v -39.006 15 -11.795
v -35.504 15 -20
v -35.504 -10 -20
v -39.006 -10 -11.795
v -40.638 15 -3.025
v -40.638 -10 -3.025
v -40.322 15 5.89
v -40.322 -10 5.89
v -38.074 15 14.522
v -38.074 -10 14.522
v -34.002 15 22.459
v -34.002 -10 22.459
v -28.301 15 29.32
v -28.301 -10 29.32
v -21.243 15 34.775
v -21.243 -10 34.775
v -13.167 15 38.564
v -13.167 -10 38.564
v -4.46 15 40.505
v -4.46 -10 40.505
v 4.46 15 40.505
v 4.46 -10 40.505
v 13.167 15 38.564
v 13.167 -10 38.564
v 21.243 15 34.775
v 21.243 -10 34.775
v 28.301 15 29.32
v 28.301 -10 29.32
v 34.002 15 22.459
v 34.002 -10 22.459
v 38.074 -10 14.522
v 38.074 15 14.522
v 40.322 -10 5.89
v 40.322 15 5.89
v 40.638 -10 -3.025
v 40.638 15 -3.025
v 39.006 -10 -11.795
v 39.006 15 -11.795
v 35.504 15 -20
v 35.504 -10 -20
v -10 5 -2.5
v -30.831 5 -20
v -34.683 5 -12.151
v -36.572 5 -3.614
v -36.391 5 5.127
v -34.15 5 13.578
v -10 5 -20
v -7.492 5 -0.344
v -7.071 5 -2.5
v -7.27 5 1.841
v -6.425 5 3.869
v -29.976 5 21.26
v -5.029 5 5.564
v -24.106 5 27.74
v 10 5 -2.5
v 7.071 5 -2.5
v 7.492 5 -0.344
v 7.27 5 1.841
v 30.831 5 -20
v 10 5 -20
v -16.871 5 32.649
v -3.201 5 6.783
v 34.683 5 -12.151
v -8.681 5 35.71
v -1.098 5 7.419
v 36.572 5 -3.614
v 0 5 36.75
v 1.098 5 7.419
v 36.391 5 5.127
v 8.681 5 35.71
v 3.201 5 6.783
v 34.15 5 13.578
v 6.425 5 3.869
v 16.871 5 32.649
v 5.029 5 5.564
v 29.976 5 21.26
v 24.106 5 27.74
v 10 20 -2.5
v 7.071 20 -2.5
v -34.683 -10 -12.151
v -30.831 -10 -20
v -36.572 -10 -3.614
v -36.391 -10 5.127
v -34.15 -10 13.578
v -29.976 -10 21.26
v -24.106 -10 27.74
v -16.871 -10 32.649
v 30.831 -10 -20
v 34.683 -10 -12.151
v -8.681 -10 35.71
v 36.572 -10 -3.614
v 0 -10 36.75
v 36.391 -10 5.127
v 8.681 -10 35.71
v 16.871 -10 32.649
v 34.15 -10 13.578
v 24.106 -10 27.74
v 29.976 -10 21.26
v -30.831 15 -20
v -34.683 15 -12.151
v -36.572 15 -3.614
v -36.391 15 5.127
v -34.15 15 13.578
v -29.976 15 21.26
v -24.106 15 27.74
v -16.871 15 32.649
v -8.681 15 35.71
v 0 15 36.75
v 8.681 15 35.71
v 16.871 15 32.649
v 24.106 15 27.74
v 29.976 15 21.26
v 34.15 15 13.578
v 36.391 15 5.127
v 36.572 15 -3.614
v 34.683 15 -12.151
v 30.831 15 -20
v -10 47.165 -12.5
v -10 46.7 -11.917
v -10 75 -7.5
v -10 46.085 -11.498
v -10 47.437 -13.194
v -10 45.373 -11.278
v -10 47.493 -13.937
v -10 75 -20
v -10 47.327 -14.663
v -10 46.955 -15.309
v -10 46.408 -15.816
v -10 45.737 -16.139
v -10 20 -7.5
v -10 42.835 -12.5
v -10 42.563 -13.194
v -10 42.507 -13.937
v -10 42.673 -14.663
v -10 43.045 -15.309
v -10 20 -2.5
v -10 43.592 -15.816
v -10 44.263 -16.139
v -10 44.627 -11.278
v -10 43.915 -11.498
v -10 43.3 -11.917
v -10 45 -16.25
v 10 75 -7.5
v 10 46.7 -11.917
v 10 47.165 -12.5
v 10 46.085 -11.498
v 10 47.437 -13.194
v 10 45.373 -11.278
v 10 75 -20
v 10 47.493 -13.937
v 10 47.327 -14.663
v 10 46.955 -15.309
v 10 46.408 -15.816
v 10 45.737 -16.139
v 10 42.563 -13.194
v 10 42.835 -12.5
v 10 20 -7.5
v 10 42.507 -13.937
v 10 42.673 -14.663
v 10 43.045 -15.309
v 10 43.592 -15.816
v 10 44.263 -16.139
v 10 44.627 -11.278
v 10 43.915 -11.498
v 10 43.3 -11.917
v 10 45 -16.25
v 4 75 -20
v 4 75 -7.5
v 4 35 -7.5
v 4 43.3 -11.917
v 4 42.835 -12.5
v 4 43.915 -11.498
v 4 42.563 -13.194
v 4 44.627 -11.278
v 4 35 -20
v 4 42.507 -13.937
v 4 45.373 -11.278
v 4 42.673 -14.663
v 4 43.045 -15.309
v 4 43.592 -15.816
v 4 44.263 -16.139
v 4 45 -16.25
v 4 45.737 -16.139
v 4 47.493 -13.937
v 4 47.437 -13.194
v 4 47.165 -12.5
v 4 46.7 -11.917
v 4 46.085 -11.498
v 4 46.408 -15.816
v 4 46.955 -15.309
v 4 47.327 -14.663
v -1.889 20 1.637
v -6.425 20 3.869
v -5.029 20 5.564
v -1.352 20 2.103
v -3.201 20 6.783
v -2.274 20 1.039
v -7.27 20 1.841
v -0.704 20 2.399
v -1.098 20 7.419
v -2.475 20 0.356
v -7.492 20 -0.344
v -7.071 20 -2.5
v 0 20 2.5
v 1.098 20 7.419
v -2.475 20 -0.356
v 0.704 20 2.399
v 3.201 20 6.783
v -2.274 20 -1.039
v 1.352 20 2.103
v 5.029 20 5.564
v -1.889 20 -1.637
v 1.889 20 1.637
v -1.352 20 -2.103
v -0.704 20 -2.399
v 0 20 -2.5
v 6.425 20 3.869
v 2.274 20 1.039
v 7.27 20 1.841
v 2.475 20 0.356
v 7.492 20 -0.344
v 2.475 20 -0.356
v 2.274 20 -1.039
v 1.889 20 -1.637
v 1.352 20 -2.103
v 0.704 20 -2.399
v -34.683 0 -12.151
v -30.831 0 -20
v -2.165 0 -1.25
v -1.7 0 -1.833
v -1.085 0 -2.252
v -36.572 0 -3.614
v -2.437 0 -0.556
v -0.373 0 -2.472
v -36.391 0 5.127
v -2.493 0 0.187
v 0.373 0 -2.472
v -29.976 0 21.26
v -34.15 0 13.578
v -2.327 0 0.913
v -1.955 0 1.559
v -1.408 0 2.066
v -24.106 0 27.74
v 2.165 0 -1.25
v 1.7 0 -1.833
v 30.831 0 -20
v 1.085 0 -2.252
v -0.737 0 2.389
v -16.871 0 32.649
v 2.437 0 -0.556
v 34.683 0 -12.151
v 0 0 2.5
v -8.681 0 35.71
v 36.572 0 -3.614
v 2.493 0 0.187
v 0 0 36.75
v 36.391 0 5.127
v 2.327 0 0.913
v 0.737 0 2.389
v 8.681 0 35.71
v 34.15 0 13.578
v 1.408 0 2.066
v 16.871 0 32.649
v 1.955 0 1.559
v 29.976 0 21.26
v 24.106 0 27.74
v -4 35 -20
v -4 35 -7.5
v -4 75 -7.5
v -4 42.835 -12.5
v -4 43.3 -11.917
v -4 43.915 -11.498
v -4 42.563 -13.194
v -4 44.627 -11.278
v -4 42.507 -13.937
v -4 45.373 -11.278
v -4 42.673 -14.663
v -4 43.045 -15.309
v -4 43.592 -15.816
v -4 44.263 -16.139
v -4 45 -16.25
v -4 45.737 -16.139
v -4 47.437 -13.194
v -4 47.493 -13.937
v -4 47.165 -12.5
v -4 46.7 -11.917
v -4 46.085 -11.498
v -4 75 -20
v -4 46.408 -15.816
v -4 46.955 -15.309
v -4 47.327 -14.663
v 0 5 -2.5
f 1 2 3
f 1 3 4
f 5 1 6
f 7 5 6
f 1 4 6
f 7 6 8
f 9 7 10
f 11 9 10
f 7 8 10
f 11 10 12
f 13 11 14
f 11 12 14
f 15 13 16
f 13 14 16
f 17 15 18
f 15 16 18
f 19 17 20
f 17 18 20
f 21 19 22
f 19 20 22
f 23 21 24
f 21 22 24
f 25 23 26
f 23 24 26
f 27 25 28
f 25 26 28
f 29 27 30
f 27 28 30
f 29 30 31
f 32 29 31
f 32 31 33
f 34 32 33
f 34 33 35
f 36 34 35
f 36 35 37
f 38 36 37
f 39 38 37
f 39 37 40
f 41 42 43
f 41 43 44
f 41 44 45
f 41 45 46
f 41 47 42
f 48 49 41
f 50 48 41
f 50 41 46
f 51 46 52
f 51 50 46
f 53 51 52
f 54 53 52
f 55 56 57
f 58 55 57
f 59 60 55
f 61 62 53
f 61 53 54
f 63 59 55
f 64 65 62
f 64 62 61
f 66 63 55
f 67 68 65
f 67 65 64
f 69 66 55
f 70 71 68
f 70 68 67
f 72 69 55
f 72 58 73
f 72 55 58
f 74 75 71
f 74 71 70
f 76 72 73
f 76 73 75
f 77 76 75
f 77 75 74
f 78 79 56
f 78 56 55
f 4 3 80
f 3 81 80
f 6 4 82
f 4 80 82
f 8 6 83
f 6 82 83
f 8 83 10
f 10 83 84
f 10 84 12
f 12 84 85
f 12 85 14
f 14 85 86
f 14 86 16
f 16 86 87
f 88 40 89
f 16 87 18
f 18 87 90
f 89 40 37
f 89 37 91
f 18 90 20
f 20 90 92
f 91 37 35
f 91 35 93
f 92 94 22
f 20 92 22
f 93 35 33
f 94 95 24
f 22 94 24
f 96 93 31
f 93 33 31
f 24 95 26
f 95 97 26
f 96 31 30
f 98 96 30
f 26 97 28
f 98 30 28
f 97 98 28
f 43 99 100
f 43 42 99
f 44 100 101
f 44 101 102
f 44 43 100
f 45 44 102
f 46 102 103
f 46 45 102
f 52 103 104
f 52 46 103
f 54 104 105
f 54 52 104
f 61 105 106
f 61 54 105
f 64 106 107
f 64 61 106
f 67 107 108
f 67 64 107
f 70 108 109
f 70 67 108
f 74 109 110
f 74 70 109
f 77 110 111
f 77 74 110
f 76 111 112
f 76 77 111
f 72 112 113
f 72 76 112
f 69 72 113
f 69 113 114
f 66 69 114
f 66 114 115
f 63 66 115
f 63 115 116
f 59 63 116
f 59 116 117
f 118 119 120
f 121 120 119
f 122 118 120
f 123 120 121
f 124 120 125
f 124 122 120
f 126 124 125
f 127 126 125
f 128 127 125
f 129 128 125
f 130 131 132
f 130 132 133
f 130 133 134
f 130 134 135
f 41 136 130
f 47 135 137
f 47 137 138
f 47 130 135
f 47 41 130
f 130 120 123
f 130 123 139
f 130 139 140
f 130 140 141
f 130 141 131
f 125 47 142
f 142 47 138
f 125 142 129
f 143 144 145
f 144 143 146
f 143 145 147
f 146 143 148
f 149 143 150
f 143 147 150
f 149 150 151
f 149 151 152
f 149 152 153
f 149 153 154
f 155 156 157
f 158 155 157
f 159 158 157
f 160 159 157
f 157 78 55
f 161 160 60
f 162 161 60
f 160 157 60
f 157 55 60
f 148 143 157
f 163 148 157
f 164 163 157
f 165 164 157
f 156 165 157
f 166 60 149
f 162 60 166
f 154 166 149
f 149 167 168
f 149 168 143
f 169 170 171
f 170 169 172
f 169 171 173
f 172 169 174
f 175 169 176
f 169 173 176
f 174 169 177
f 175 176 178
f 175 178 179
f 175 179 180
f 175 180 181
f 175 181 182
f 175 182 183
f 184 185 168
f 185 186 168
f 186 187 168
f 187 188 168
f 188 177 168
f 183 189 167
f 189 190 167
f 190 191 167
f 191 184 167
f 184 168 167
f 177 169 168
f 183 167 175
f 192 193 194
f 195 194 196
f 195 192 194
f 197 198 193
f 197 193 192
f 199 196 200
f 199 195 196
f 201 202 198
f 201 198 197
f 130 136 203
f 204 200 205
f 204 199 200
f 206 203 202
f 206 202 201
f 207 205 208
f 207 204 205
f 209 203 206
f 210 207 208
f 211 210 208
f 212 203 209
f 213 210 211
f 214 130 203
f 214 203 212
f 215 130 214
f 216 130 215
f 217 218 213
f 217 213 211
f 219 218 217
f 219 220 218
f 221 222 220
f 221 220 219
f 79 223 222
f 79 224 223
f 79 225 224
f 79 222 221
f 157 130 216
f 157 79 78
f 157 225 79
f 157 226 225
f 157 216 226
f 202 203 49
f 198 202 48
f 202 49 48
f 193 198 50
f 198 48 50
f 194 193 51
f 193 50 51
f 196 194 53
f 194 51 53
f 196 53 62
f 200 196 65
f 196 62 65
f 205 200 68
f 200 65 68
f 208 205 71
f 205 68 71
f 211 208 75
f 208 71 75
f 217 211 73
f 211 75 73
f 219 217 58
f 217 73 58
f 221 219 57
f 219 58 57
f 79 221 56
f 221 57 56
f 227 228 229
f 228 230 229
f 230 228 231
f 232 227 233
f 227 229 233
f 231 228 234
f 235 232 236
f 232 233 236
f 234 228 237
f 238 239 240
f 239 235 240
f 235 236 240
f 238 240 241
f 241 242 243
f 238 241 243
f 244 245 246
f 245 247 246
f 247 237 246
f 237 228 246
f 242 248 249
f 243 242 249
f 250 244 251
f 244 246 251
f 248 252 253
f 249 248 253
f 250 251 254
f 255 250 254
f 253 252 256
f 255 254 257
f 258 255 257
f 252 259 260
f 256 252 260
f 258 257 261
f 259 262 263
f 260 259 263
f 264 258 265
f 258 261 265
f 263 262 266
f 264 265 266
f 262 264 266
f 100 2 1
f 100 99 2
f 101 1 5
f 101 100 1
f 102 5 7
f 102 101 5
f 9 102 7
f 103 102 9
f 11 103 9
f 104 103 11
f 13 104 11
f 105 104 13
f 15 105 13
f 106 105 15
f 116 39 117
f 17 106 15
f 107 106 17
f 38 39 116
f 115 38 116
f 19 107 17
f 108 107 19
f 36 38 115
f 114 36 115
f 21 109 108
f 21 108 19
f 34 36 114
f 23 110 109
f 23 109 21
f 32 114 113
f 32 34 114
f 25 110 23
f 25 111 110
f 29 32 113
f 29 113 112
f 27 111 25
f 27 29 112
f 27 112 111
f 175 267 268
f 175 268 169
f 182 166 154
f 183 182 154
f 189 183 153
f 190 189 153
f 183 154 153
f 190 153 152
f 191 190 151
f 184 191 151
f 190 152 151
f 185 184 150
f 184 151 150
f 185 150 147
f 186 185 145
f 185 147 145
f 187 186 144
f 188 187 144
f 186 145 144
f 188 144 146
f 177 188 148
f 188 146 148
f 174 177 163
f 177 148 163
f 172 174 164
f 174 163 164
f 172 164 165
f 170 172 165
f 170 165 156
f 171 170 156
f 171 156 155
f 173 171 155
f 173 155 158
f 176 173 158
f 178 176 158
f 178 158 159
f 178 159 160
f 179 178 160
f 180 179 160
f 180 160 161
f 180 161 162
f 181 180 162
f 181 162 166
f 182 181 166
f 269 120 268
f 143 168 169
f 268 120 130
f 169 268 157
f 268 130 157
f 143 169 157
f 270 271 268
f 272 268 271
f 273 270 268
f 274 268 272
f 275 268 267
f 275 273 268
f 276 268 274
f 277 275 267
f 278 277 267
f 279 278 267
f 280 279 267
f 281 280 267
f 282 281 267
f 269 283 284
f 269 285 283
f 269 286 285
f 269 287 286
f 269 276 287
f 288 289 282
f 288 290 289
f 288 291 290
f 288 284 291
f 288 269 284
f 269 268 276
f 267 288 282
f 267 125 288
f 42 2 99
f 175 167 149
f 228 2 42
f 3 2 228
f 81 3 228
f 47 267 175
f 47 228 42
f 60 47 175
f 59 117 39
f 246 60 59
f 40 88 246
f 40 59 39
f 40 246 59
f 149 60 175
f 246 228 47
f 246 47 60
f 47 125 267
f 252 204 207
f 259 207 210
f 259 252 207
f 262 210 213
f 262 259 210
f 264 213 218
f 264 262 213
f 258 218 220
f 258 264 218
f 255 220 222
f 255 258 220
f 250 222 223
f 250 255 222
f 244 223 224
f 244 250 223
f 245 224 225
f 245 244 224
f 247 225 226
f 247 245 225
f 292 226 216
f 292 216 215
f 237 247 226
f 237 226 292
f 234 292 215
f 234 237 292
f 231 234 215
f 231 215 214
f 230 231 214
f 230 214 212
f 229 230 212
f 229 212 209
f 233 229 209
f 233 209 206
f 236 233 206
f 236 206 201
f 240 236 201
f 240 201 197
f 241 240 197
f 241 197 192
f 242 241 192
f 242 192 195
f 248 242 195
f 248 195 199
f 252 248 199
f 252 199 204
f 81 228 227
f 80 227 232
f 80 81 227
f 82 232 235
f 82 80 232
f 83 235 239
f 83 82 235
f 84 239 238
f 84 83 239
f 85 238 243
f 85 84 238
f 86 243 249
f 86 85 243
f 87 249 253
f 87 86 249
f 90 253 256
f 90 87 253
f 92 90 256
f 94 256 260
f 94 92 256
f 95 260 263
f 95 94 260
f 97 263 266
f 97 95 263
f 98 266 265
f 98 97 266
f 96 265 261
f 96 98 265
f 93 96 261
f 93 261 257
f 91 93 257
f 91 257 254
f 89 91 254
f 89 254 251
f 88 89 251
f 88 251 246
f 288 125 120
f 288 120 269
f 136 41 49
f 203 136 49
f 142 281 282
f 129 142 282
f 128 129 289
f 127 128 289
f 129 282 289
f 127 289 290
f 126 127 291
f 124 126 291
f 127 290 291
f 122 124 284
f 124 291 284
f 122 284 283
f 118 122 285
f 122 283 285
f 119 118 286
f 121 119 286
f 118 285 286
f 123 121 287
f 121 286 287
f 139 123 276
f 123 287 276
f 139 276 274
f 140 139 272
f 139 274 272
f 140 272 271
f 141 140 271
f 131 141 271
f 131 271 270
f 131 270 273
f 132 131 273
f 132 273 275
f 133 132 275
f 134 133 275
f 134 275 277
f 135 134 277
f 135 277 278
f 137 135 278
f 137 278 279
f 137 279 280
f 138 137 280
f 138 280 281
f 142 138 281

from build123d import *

# Parameters (mm, degrees)
SKETCH_1_R                      = 7.5
SKETCH_1_R_2                    = 2.5
EXTRUDE_1_DEPTH                 = 20
SKETCH_2_R                      = 40.75
SKETCH_2_R_2                    = 2.5
EXTRUDE_2_DEPTH                 = 5
EXTRUDE_T_DEPTH                 = 10
EXTRUDE_T_DEPTH_BACK            = 15
SKETCH_3_R                      = 40.75
SKETCH_3_R_2                    = 36.75
SKETCH_4_W                      = 20
SKETCH_4_H                      = 17.5
EXTRUDE_4_DEPTH                 = 70
SKETCH_6_W                      = 8
SKETCH_6_H                      = 17.5
CUT_EXTRUDE_5_DEPTH             = 40
CUT_EXTRUDE_6_REACH             = 101.303
SKETCH_7_R                      = 2.5
CUT_EXTRUDE_7_REACH             = 96.584
SKETCH_8_W                      = 71.008802272
SKETCH_8_H                      = 20.75
CUT_EXTRUDE_7_DIRECTION_2_REACH = 96.584
CUT_EXTRUDE_START               = -55
SKETCH_9_W                      = 20
SKETCH_9_H                      = 5
CUT_EXTRUDE_8_DEPTH             = 55


with BuildPart() as part:
    # Эскиз1 → Вытянуть1 (new body)
    with BuildSketch(Plane(origin=(0, 0, 0), x_dir=(1, 0, 0), z_dir=(0, 1, 0))):
        with Locations(Location((0, 0, 0), (0, 0, 270))):
            Circle(SKETCH_1_R)
        with Locations(Location((0, 0, 0), (0, 0, 270))):
            Circle(SKETCH_1_R_2, mode=Mode.SUBTRACT)
    extrude(amount=EXTRUDE_1_DEPTH)

    # Эскиз2 → Вытянуть2 (add)
    with BuildSketch(Plane(origin=(0, 0, 0), x_dir=(1, 0, 0), z_dir=(0, 1, 0))):
        with Locations(Location((0, 0, 0), (0, 0, 270))):
            Circle(SKETCH_2_R)
        with Locations(Location((0, 0, 0), (0, 0, 270))):
            Circle(SKETCH_2_R_2, mode=Mode.SUBTRACT)
    extrude(amount=EXTRUDE_2_DEPTH)

    # Эскиз3 → t (add, two sides: drawn at the far end of the back side and taken through both)
    with BuildSketch(Plane(origin=(0, 5, 0), x_dir=(1, 0, 0), z_dir=(0, 1, 0)).offset(-EXTRUDE_T_DEPTH_BACK)):
        with Locations(Location((0, 0, 0), (0, 0, 270))):
            Circle(SKETCH_3_R)
        with Locations(Location((0, 0, 0), (0, 0, 270))):
            Circle(SKETCH_3_R_2, mode=Mode.SUBTRACT)
    extrude(amount=EXTRUDE_T_DEPTH + EXTRUDE_T_DEPTH_BACK)

    # Эскиз4 → Вытянуть4 (add)
    with BuildSketch(Plane(origin=(0, 5, 0), x_dir=(1, 0, 0), z_dir=(0, 1, 0))):
        with Locations((0, 11.25)):
            Rectangle(SKETCH_4_W, SKETCH_4_H)
    extrude(amount=EXTRUDE_4_DEPTH)

    # Эскиз6 → Вытянуть5 (cut)
    with BuildSketch(Plane(origin=(0, 75, 0), x_dir=(1, 0, 0), z_dir=(0, 1, 0))):
        with Locations((0, 11.25)):
            Rectangle(SKETCH_6_W, SKETCH_6_H)
    extrude(amount=-CUT_EXTRUDE_5_DEPTH, mode=Mode.SUBTRACT)

    # Вытянуть6: up to this face of the body (flat: up to its plane)
    cut_extrude_6_end = Plane(part.part.faces().sort_by_distance((-10, 40, -11.25))[0])
    # Эскиз7 → Вытянуть6 (cut, up to the picked face)
    with BuildSketch(Plane(origin=(10, 0, 0), x_dir=(0, 0, -1), z_dir=(1, 0, 0)), mode=Mode.PRIVATE) as cut_extrude_6_sk1:
        with Locations((13.75, 45)):
            Circle(SKETCH_7_R)
    cut_extrude_6_tool1 = split(extrude(cut_extrude_6_sk1.sketch, amount=-CUT_EXTRUDE_6_REACH, mode=Mode.PRIVATE), bisect_by=cut_extrude_6_end, keep=Keep.BOTH, mode=Mode.PRIVATE)
    add(cut_extrude_6_tool1.solids().sort_by(Axis((10, 45, -13.75), (-1, 0, 0)))[0], mode=Mode.SUBTRACT)

    # Эскиз8 → Вытянуть7 (cut, up to next)
    with BuildSketch(Plane(origin=(0, 0, 0), x_dir=(1, 0, 0), z_dir=(0, 1, 0)), mode=Mode.PRIVATE) as cut_extrude_7_sk1:
        with Locations((0, 30.375)):
            Rectangle(SKETCH_8_W, SKETCH_8_H)
    cut_extrude_7_tool1 = extrude(cut_extrude_7_sk1.sketch, amount=CUT_EXTRUDE_7_REACH, mode=Mode.PRIVATE) & part.part
    add(cut_extrude_7_tool1.solids().sort_by_distance((0, 0, -30.375))[0], mode=Mode.SUBTRACT)

    # Эскиз8 → Вытянуть7 direction 2 (cut, up to next)
    with BuildSketch(Plane(origin=(0, 0, 0), x_dir=(1, 0, 0), z_dir=(0, 1, 0)), mode=Mode.PRIVATE) as cut_extrude_7_direction_2_sk1:
        with Locations((0, 30.375)):
            Rectangle(SKETCH_8_W, SKETCH_8_H)
    cut_extrude_7_direction_2_tool1 = extrude(cut_extrude_7_direction_2_sk1.sketch, amount=-CUT_EXTRUDE_7_DIRECTION_2_REACH, mode=Mode.PRIVATE) & part.part
    add(cut_extrude_7_direction_2_tool1.solids().sort_by_distance((0, 0, -30.375))[0], mode=Mode.SUBTRACT)

    # Эскиз9 → Вытянуть8 (cut)
    with BuildSketch(Plane(origin=(0, 75, 0), x_dir=(1, 0, 0), z_dir=(0, 1, 0)).offset(CUT_EXTRUDE_START)):
        with Locations((0, 5)):
            Rectangle(SKETCH_9_W, SKETCH_9_H)
    extrude(amount=CUT_EXTRUDE_8_DEPTH, mode=Mode.SUBTRACT)


solid = part.part
